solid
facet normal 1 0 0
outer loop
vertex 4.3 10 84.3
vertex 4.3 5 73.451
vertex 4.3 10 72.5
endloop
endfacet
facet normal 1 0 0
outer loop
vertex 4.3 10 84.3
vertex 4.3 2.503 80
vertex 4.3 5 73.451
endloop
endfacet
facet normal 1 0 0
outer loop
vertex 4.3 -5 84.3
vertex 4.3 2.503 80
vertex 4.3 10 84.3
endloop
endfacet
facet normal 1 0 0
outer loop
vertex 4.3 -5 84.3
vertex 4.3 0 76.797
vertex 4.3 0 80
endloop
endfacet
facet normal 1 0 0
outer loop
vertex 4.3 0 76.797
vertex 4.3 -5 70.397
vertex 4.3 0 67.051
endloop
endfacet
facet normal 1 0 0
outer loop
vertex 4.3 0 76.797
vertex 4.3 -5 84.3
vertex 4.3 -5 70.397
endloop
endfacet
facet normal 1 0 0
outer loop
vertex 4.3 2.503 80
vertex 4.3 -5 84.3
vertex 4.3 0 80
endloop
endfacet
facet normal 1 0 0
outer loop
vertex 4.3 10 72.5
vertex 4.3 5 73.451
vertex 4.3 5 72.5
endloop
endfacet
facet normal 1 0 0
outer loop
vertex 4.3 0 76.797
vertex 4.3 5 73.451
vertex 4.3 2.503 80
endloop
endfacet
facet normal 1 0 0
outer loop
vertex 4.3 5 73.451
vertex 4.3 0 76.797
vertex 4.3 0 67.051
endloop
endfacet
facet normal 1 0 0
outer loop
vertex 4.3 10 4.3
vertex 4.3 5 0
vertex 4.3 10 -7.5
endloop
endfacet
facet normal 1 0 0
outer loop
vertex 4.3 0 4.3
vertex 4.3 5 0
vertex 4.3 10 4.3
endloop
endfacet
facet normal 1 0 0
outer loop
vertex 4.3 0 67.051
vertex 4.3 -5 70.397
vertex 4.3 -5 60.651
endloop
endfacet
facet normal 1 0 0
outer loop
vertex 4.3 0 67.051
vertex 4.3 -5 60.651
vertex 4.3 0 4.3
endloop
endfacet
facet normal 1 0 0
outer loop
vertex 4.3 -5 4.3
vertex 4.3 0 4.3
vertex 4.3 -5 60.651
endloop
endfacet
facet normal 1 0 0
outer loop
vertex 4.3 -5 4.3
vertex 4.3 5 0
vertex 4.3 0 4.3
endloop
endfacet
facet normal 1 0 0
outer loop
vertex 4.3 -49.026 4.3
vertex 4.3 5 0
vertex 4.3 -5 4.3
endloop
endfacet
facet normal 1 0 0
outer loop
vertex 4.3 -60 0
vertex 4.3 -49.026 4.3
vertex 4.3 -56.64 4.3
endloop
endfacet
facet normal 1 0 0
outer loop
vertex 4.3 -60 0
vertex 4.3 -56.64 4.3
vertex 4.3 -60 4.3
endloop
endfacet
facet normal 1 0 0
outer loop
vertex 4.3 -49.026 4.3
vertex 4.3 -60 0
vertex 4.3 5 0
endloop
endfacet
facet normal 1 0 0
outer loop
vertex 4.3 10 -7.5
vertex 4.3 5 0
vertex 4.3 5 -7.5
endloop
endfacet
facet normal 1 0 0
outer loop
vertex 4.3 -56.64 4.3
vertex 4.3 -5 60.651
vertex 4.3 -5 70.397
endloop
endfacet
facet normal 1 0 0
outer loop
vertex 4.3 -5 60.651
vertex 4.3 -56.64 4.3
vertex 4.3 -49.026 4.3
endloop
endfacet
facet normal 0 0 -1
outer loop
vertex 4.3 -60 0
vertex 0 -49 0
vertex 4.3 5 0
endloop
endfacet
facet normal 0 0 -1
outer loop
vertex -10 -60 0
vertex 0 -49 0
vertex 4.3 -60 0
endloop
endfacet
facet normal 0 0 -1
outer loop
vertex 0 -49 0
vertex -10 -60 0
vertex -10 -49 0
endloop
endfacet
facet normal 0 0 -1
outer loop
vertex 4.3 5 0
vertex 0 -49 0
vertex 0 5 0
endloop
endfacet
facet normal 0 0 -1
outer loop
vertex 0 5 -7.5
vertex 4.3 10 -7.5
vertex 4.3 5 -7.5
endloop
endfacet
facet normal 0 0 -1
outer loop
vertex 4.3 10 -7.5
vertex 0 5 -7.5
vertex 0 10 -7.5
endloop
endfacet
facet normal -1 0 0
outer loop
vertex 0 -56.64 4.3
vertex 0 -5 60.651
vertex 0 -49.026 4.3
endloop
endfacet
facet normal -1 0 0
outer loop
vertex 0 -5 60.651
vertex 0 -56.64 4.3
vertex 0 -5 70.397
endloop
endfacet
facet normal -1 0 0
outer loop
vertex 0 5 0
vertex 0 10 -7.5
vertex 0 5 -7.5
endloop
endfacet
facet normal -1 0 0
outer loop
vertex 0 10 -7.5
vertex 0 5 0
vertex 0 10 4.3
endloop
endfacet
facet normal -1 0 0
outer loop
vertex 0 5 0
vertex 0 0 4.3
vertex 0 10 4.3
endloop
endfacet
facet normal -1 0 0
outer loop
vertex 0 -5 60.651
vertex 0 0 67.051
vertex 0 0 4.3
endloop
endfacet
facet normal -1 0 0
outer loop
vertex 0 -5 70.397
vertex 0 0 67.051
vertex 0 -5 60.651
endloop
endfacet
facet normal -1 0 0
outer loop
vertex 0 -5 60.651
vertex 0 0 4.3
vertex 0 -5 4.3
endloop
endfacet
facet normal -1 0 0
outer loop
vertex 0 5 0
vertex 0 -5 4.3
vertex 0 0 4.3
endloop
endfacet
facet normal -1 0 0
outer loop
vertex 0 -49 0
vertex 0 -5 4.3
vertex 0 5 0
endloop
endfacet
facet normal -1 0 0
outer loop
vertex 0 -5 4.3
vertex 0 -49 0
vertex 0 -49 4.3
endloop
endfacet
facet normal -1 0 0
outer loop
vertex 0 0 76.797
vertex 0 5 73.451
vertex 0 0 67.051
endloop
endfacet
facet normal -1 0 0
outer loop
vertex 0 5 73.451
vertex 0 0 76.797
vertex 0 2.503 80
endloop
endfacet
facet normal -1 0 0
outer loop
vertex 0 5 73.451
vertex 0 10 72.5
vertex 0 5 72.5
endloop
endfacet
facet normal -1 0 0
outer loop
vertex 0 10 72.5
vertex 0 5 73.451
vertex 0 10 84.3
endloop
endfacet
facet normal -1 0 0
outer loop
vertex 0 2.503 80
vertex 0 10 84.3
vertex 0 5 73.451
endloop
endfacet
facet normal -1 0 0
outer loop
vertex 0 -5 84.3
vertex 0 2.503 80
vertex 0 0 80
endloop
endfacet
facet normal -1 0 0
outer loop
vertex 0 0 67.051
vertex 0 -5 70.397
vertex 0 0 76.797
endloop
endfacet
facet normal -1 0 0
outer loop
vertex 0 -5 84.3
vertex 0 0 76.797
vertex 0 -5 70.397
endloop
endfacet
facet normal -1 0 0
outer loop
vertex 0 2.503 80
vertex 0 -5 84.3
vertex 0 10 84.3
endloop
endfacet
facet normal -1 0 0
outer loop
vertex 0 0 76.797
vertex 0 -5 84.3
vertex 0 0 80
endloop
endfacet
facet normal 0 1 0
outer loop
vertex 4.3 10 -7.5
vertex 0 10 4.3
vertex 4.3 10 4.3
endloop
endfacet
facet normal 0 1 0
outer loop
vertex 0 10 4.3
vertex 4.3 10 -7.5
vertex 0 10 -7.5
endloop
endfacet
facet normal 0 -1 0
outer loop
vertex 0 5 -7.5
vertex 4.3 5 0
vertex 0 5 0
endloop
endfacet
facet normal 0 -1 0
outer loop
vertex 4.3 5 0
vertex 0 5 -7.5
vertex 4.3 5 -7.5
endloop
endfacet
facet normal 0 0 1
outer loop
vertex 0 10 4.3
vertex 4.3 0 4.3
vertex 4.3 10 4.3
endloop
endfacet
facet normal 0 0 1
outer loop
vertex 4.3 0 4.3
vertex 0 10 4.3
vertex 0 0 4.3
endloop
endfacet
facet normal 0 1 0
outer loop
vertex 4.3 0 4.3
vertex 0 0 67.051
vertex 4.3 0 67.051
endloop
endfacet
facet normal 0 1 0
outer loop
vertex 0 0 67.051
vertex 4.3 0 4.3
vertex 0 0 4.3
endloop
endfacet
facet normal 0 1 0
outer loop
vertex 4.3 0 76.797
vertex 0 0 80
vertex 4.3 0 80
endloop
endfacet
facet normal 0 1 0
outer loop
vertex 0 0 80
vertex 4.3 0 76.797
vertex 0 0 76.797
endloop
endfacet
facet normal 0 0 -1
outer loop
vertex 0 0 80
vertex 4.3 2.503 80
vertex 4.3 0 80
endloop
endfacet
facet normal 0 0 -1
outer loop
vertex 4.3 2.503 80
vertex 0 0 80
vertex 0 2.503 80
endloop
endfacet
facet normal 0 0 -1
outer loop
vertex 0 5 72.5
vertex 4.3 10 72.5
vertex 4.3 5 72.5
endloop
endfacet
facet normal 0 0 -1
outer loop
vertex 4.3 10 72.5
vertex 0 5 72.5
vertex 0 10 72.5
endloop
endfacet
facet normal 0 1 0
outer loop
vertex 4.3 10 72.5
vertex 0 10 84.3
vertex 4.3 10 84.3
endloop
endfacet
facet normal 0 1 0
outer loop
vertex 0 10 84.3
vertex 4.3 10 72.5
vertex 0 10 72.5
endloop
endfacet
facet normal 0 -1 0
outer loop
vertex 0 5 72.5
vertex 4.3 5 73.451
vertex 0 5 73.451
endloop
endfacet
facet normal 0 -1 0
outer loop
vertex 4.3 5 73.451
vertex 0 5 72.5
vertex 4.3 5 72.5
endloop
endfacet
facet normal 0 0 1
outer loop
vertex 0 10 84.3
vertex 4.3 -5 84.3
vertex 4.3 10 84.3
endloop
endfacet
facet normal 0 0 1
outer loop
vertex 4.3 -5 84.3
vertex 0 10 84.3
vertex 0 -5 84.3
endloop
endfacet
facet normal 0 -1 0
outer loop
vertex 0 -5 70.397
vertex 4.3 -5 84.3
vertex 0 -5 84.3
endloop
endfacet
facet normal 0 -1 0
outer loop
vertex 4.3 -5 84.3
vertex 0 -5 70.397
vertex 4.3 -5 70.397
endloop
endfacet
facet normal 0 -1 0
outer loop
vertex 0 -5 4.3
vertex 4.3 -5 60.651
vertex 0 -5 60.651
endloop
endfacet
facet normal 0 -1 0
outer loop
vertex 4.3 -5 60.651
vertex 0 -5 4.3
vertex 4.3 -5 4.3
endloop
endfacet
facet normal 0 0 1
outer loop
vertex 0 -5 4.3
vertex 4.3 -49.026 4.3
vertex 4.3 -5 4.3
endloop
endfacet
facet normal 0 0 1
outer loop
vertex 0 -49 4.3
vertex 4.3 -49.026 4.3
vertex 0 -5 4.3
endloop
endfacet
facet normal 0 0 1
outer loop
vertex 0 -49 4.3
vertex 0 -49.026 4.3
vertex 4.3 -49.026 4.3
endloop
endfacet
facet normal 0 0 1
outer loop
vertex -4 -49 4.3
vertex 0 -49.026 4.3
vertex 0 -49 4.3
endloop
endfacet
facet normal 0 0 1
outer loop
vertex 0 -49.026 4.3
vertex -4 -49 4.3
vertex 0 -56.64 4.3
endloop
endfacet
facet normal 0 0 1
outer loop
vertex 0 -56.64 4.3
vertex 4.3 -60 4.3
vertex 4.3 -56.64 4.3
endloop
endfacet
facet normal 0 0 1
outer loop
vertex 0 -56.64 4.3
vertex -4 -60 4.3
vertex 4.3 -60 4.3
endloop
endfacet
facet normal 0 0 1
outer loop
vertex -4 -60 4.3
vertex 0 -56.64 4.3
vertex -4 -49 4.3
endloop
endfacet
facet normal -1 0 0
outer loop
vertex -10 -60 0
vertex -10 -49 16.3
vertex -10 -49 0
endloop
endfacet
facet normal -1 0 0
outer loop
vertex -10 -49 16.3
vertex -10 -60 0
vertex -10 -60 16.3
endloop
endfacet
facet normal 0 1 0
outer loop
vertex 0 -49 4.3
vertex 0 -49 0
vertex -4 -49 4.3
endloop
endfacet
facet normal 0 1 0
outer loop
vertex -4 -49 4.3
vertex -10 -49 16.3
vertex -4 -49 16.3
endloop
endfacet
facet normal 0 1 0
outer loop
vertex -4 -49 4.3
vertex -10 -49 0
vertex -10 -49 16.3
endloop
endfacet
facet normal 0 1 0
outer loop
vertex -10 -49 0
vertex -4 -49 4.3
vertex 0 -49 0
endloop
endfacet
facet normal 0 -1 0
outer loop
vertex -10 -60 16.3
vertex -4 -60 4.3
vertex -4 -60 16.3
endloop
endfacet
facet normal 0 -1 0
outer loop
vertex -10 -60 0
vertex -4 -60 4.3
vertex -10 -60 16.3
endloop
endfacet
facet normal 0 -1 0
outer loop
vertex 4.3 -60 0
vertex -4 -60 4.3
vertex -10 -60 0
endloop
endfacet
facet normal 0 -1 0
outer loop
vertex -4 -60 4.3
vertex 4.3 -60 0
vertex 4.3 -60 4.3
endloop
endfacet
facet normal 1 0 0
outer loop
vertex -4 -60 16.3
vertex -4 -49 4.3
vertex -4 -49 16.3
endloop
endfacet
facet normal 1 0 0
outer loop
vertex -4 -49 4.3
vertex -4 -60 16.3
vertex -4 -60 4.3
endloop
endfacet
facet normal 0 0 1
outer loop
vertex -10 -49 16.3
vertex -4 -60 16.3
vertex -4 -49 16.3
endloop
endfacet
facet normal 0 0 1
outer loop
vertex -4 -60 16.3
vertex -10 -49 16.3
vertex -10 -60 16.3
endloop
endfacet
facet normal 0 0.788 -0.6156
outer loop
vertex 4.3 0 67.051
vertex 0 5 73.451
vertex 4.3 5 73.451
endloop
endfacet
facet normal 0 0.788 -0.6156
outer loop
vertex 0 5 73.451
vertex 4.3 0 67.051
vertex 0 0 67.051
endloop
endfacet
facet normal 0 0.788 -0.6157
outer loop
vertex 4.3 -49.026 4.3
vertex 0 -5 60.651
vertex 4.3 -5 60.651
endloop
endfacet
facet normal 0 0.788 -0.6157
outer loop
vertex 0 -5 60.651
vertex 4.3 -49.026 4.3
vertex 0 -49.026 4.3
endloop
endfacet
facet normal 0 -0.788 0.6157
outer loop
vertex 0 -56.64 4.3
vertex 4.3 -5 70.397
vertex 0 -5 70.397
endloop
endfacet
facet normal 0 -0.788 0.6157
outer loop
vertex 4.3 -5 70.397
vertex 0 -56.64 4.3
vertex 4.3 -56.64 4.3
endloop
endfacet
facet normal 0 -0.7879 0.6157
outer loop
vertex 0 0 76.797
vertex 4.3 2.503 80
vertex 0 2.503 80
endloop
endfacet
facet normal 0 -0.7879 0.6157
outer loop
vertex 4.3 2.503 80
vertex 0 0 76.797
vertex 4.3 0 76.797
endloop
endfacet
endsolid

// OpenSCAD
// file: ../../modules/skadis.scad
ikea_skadis_hole_w = 4.3;
ikea_skadis_hook_depth = 5;
ikea_skadis_hole_h = 7.5;
ikea_skadis_holes_dist = 80;
ikea_skadis_holes_horiz_dist = 40;

module skadis_hook() {
    color("green")
    translate([0,ikea_skadis_hook_depth,-ikea_skadis_hole_h]) cube([ikea_skadis_hole_w,ikea_skadis_hook_depth,ikea_skadis_hole_h ]);

    color("violet")
    translate([0,0,0]) cube([ikea_skadis_hole_w,ikea_skadis_hook_depth*2,ikea_skadis_hole_w ]);
}

module skadis_double_hooks() {
    skadis_hook();
    
    translate([0,0,ikea_skadis_holes_dist]) skadis_hook();
    
    color("yellow")
    translate([0,-ikea_skadis_hook_depth,0])
    cube([ikea_skadis_hole_w,ikea_skadis_hook_depth,ikea_skadis_holes_dist + ikea_skadis_hole_w]);
}

module skadis_triple_horiz_hooks() {
    translate([-20 - ikea_skadis_hole_w / 2,0,0]) union() {
        skadis_hook();
        translate([20,0,-20]) skadis_hook();
        translate([40,0,0]) skadis_hook();
    }
}

//skadis_double_hooks();
//skadis_triple_horiz_hooks();
// main file
include <../../modules/skadis.scad>;

skadis_double_hooks();

h = 90;
w = 4.3;
d = 6;

grip = 3;

base_grip = 11;

support_d = 60;

finger_d = 10;

cut = 3;

sx_dx = 0; //0 DX, 1 SX

skadis_double_hooks();


color("blue")
translate([0,-support_d,0]) cube([w, support_d, w]);

if (sx_dx == 0) {
    color("red")
    translate([-finger_d,-support_d,0]) cube([finger_d,base_grip,w]);
        
    color("black")
    translate([-finger_d,-support_d,w]) cube([d,base_grip,d * 2]);
}

if (sx_dx == 1) {
    color("red")
    translate([w,-support_d,0]) cube([finger_d,base_grip,w]);
        
    color("black")
    translate([w + finger_d - d,-support_d,w]) cube([d,base_grip,d * 2]);
}

color("orange")
difference() {
    translate([0,-support_d ,0]) rotate([-38,0,0]) cube([w,d,120]);
    translate([-cut,ikea_skadis_hook_depth,0]) cube([w + cut * 2,d*3,120]);
    translate([-cut,-support_d,-w]) cube([w + cut * 2, support_d, w]);
}
